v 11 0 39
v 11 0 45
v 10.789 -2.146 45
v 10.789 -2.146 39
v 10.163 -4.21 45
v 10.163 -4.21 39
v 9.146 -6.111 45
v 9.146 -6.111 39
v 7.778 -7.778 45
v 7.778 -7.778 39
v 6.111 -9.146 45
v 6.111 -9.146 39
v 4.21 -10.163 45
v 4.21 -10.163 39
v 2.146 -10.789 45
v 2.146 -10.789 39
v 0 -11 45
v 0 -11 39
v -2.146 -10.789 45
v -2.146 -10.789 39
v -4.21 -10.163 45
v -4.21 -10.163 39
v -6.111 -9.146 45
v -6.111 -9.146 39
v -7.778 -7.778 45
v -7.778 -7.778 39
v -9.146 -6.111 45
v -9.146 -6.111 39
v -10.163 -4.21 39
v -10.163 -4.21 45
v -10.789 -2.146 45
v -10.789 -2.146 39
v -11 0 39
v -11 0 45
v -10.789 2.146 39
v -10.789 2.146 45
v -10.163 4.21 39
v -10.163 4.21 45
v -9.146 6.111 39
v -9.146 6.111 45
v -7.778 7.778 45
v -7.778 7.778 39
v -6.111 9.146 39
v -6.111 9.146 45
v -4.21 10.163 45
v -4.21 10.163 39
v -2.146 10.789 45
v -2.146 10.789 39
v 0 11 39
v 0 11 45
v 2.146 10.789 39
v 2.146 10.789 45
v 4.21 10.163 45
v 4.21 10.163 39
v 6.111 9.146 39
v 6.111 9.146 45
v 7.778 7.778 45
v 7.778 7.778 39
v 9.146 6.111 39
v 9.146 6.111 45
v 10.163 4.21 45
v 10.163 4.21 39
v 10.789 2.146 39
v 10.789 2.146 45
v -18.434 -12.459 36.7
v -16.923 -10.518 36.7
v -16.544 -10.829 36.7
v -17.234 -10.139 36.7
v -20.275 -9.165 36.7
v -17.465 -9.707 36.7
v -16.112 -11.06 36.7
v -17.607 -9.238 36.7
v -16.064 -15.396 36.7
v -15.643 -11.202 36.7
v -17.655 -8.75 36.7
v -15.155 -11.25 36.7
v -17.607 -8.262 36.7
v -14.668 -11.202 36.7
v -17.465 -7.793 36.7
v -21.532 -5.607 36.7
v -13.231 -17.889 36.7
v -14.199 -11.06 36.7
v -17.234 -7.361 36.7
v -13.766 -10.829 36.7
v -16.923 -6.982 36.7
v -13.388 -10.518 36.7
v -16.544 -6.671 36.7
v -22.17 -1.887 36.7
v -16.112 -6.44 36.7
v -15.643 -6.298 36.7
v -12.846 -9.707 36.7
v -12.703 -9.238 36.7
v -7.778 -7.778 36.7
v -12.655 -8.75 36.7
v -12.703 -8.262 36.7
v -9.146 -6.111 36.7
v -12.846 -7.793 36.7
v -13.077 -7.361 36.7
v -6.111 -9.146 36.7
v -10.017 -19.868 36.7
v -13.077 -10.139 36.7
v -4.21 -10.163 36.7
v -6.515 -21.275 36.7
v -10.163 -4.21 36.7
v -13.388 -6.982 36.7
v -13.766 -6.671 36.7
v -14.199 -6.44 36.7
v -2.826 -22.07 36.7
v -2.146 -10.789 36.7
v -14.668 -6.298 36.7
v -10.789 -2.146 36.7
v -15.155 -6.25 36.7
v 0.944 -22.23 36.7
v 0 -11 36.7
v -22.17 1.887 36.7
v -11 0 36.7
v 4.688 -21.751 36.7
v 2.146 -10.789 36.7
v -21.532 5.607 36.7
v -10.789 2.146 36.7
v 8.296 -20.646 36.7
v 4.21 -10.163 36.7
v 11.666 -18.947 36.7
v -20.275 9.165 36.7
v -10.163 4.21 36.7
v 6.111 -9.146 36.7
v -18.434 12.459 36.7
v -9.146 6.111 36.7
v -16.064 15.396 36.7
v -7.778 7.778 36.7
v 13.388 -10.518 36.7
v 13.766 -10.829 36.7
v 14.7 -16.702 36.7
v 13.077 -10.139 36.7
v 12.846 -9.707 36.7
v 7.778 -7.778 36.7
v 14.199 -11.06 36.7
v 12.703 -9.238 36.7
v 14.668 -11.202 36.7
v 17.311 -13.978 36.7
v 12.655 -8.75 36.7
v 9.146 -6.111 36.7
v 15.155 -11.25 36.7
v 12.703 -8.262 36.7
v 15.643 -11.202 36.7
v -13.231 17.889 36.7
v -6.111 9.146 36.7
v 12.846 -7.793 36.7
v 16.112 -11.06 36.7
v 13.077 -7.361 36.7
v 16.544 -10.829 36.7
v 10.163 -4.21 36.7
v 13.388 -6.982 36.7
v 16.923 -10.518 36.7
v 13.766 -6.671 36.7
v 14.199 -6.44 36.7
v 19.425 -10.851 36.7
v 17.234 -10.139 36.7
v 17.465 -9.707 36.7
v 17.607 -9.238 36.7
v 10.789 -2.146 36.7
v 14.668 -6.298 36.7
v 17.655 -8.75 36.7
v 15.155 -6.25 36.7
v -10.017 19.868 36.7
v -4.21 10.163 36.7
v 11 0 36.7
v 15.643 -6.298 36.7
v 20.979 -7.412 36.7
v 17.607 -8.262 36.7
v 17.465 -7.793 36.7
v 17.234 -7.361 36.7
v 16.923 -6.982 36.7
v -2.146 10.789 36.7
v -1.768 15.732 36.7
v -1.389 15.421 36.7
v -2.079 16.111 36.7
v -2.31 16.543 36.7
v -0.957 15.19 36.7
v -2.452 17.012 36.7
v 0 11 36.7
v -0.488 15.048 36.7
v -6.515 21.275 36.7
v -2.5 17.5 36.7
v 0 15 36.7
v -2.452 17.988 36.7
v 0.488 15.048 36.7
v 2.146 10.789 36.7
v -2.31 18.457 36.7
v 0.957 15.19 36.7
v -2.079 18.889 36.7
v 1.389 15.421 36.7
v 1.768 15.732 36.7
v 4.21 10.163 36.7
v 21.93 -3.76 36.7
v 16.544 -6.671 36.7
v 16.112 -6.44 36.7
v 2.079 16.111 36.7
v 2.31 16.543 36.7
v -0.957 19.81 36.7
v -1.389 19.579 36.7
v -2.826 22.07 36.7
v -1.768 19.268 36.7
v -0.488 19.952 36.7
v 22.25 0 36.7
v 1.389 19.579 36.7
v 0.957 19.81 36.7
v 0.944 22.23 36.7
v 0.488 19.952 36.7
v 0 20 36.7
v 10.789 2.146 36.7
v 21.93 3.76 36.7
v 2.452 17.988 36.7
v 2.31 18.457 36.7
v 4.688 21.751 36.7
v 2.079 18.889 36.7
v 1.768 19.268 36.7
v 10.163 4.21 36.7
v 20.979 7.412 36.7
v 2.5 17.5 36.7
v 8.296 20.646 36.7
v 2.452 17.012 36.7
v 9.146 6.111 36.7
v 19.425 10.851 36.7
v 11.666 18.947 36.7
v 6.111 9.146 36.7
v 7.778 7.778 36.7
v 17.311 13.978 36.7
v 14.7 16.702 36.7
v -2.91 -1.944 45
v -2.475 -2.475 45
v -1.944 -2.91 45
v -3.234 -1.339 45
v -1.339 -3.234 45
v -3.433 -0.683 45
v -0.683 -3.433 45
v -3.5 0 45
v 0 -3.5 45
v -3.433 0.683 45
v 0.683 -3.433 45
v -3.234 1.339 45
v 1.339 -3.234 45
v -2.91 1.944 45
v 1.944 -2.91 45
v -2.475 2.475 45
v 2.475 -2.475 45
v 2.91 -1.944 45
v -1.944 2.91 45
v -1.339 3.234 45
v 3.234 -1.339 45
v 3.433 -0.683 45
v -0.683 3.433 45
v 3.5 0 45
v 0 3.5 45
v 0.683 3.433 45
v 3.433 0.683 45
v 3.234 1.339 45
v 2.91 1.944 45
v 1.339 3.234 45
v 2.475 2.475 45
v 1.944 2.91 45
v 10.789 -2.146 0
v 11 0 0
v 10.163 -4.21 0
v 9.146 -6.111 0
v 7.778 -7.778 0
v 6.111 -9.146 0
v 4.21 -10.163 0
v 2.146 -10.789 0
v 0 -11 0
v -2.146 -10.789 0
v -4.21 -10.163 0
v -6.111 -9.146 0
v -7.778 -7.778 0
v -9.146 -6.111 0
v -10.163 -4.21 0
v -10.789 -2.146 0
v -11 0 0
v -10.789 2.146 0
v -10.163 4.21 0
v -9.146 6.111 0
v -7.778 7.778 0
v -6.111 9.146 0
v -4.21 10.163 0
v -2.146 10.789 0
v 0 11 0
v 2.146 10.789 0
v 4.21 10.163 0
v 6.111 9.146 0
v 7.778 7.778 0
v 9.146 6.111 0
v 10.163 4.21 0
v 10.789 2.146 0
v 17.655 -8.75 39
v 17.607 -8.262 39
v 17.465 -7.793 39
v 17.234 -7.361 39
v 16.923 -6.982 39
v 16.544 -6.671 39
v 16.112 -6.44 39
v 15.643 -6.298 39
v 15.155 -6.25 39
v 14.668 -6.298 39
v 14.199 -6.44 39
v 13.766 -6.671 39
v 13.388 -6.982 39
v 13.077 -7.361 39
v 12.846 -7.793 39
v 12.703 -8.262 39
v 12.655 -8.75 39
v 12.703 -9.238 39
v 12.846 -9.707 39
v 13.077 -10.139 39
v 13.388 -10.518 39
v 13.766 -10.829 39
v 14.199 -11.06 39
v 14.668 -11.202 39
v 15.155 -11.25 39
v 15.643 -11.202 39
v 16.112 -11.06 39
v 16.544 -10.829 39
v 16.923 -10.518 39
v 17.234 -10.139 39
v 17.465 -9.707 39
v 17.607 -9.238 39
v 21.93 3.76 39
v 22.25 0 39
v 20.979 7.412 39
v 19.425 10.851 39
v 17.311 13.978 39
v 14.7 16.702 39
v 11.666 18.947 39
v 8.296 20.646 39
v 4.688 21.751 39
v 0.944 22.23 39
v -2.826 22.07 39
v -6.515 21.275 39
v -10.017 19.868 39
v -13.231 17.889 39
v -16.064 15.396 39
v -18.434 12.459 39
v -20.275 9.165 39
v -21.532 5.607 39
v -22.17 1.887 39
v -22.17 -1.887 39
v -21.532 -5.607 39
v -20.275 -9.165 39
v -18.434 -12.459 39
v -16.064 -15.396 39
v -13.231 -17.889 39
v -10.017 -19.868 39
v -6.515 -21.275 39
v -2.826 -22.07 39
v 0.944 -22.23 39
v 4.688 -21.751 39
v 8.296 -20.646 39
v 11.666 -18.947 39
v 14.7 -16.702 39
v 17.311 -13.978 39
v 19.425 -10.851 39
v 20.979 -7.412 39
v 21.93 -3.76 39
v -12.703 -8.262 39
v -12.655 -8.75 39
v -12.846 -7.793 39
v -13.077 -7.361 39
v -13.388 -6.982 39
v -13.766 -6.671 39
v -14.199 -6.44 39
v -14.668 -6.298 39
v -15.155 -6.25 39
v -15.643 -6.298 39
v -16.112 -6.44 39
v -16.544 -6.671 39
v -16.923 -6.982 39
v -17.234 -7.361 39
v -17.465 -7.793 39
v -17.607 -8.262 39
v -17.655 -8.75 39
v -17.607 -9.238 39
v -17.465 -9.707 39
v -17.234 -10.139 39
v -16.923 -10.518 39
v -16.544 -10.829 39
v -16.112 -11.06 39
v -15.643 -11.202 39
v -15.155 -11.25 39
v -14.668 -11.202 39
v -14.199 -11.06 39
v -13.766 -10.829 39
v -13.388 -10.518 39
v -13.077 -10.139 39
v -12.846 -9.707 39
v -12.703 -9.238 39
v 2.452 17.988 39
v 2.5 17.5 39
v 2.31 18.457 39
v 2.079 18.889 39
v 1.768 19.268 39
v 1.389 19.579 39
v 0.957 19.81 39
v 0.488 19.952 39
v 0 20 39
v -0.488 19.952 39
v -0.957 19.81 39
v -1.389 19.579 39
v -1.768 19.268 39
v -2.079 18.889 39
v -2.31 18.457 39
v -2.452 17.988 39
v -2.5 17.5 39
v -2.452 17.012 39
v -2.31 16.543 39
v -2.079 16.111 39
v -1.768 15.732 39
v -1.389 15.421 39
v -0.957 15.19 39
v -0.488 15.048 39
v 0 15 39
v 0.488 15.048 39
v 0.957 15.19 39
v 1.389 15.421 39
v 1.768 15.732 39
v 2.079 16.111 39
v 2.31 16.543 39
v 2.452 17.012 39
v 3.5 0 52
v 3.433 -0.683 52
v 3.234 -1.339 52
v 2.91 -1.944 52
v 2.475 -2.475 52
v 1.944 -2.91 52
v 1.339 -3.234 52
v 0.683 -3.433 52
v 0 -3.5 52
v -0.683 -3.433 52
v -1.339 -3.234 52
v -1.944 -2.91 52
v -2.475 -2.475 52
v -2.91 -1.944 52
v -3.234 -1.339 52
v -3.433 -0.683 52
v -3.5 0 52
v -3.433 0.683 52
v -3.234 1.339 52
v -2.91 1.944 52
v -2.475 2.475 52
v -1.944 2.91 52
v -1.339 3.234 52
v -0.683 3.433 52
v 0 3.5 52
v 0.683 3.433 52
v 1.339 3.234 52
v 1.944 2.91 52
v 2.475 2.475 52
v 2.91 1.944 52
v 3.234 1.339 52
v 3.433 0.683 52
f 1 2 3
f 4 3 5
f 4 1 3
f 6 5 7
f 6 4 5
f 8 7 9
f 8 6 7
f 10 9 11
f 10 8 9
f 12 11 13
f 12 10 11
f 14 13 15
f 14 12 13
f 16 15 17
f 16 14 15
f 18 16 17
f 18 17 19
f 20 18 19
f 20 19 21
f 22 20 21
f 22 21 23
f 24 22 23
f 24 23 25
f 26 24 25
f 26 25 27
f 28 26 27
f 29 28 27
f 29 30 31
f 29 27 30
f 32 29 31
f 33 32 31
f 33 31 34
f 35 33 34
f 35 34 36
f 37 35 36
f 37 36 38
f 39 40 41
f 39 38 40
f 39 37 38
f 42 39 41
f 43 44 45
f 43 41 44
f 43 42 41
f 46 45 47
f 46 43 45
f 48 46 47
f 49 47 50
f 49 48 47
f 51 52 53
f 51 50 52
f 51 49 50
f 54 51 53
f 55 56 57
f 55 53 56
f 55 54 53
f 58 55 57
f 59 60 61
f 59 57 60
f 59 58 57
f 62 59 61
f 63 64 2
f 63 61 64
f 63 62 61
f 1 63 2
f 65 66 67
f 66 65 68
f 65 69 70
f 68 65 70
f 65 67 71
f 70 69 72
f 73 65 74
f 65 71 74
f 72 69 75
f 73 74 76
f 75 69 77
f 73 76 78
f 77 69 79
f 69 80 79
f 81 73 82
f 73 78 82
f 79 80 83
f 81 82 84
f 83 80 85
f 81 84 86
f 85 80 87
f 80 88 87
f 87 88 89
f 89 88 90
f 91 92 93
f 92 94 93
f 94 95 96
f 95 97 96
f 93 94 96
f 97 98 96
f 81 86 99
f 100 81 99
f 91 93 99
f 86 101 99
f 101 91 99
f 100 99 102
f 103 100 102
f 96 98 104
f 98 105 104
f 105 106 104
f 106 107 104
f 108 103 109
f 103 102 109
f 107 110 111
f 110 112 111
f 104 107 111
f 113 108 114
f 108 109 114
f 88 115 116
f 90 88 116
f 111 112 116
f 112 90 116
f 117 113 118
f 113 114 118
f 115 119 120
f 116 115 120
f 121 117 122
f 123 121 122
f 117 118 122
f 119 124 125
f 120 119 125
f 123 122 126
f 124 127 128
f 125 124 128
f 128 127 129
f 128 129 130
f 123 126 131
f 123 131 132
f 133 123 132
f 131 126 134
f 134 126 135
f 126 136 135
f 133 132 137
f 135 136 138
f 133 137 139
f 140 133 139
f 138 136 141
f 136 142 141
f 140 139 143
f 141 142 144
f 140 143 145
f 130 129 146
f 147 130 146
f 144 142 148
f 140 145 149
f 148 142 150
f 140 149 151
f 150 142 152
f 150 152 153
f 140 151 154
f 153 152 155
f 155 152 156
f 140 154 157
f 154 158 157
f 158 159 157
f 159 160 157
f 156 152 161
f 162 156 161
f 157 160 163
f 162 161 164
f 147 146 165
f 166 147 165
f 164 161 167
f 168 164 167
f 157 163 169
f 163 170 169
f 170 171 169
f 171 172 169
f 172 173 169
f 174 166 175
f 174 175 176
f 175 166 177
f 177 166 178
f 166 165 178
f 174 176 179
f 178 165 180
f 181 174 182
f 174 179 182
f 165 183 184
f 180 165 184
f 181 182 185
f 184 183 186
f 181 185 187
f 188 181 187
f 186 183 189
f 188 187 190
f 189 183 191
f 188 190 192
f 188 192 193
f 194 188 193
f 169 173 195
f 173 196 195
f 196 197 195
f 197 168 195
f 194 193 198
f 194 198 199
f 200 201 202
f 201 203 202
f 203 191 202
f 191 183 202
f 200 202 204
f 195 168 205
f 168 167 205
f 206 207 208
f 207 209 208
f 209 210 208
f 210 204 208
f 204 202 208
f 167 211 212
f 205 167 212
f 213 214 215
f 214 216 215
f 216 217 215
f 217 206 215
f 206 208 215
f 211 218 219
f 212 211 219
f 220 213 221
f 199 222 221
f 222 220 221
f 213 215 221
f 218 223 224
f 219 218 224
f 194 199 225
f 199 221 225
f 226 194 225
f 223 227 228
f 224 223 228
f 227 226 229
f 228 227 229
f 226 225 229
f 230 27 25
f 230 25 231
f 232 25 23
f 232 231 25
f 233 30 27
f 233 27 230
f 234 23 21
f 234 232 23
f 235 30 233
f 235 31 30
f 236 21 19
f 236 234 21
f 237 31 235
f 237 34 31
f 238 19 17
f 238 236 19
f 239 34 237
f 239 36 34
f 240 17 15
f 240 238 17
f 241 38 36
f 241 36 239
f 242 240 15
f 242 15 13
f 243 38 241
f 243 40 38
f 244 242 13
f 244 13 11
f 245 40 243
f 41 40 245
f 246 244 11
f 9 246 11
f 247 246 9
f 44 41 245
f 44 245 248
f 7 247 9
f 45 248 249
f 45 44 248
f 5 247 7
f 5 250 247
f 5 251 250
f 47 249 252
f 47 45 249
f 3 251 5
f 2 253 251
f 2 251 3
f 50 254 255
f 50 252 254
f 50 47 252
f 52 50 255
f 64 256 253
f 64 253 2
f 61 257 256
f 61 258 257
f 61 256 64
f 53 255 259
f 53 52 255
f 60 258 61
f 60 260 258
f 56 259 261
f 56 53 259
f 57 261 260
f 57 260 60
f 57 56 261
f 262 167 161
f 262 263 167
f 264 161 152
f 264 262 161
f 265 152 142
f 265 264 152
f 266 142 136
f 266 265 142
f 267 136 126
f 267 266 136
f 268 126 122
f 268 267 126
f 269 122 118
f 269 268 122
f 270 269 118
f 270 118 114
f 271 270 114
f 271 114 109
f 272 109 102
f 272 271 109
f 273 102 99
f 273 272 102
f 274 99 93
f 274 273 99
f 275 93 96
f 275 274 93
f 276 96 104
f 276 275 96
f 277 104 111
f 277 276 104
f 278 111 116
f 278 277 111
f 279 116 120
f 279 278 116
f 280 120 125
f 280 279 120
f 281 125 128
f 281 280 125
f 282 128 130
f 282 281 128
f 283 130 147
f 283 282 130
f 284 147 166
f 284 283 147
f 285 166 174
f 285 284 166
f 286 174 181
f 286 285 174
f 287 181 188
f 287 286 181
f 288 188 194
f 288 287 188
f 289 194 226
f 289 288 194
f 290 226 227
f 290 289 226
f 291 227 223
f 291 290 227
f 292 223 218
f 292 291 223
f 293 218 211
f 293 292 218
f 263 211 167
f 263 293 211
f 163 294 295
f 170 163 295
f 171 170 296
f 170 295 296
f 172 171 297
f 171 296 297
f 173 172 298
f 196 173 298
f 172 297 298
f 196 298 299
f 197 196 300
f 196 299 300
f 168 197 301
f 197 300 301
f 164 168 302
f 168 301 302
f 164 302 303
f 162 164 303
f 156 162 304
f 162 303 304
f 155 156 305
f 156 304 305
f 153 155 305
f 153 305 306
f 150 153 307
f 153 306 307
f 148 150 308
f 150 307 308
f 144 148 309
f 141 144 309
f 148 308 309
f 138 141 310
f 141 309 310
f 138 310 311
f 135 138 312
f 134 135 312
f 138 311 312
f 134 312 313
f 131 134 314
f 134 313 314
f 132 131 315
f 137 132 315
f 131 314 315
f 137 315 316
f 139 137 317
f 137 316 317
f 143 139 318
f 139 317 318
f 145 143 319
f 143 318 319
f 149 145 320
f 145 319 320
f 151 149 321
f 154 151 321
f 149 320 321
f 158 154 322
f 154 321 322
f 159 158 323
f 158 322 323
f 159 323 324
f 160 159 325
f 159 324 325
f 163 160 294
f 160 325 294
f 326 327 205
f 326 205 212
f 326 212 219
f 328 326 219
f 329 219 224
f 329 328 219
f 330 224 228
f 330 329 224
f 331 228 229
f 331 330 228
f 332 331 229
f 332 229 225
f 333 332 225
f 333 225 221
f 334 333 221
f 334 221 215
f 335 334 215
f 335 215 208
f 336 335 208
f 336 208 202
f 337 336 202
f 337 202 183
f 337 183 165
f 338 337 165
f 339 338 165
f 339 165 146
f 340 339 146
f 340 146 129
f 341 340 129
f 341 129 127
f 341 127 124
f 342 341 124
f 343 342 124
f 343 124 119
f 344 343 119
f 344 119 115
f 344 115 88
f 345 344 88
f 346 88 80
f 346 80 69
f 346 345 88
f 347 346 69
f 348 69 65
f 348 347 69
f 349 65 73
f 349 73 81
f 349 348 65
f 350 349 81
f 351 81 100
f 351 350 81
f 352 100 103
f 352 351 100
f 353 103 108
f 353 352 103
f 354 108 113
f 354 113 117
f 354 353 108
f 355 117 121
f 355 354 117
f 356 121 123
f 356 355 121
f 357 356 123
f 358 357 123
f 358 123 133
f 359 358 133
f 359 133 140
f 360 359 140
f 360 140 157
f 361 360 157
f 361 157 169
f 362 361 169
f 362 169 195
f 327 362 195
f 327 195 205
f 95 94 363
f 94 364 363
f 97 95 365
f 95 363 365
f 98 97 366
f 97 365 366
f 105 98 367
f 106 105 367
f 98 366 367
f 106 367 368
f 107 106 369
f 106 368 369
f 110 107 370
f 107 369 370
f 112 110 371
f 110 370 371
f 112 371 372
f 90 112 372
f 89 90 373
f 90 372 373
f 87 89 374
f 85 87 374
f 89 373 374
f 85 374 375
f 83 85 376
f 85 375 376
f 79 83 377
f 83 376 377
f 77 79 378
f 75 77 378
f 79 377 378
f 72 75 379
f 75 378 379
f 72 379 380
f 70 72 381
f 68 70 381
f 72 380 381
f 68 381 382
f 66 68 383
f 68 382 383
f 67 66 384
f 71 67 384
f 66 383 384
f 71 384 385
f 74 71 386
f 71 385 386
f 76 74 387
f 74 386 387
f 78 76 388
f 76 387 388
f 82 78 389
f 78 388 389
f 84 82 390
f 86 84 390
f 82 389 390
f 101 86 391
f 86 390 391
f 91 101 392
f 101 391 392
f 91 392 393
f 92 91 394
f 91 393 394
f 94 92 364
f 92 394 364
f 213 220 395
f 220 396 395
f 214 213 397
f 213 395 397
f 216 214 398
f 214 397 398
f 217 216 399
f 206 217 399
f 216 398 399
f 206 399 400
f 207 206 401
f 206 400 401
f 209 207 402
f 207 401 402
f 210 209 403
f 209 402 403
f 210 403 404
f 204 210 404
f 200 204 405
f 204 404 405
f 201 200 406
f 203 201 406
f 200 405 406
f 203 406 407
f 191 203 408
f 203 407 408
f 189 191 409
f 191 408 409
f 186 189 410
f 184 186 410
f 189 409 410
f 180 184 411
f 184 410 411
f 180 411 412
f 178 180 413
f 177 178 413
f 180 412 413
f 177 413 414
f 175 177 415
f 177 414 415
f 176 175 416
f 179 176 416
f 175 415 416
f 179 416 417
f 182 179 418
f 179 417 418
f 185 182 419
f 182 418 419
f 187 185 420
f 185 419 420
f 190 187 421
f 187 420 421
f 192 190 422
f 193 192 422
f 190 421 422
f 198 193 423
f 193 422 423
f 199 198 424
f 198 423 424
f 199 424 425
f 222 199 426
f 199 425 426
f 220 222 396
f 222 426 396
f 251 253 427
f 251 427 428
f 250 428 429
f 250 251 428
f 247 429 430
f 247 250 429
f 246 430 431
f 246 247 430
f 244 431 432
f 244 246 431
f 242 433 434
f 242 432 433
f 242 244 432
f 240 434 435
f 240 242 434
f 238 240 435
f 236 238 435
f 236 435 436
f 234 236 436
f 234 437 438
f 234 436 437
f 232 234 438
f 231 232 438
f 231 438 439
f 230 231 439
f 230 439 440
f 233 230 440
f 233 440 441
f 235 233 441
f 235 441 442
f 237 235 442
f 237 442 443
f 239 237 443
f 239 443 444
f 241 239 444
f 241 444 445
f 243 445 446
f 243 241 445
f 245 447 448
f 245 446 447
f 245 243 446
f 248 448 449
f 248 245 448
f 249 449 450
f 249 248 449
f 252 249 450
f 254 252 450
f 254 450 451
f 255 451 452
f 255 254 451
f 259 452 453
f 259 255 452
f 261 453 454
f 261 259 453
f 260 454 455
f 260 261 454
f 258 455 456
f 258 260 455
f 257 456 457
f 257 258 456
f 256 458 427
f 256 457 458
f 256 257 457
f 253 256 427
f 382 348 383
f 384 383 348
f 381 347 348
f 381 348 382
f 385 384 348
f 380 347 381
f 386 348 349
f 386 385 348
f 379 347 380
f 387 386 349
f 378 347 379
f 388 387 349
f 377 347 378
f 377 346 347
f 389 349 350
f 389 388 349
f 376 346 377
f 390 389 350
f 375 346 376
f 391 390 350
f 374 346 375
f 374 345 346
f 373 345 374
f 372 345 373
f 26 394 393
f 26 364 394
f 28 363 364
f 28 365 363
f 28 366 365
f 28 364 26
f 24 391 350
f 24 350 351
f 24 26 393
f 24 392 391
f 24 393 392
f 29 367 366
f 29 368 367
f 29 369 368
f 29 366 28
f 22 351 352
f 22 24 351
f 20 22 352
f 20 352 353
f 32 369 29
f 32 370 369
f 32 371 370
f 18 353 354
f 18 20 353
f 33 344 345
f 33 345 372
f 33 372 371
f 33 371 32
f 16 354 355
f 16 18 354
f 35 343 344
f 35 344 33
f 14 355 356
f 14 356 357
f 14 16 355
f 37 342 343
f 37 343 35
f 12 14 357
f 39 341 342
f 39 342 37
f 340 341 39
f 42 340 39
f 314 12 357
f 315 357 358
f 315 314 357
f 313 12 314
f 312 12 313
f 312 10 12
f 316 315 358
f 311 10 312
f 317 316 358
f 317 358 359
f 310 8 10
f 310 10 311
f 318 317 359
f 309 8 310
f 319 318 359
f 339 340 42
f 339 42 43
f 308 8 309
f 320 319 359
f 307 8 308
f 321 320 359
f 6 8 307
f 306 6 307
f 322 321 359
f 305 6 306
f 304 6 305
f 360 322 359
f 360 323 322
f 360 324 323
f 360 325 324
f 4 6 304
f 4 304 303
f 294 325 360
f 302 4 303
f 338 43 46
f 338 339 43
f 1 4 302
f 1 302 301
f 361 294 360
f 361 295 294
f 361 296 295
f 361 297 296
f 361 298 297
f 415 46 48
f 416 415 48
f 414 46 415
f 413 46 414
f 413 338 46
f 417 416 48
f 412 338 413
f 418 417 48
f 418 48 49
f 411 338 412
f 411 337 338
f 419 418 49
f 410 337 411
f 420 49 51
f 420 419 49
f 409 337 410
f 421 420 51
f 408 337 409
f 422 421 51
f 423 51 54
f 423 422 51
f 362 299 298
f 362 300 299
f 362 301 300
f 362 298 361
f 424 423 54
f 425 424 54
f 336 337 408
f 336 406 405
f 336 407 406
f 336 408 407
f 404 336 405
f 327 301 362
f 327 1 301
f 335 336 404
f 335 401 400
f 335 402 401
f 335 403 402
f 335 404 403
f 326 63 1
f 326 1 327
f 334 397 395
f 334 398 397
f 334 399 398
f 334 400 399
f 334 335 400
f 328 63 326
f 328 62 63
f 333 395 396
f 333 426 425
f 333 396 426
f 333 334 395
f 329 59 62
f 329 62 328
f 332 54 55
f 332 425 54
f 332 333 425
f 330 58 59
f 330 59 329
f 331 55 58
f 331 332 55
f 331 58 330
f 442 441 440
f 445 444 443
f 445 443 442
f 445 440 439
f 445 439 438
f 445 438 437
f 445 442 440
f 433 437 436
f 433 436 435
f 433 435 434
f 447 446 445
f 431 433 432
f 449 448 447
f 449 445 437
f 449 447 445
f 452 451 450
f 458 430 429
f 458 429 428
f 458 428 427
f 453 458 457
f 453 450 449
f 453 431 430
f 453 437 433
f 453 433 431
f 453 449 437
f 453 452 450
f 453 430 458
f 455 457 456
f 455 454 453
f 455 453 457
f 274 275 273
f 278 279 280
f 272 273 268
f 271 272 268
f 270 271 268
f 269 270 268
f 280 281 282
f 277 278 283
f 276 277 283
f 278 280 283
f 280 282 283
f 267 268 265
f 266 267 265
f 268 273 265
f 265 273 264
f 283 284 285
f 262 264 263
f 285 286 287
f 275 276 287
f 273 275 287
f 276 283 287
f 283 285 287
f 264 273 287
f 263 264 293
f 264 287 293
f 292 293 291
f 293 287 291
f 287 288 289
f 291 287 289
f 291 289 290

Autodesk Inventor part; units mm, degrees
ref_plane "YZ Plane" through (0, 0, 0) normal (1, 0, 0) x (0, 1, 0)
ref_plane "XZ Plane" through (0, 0, 0) normal (0, 1, 0) x (-1, 0, 0)
sketch "Sketch1" plane through (0, 0, 0) normal (0, 0, 1) x (1, 0, 0)
  circle A0 centre (0, 0) radius 11
  dimension "d0" = 22
extrude "Extrusion1" add sketch "Sketch1" along normal blind 45
ref_plane "Work Plane1" through (0, 0, 39) normal (0, 0, 1) x (1, 0, 0)
sketch "Sketch2" plane through (0, 0, 39) normal (0, 0, 1) x (1, 0, 0)
  circle A0 centre (0, 0) radius 22.25
  circle A1 centre (0, 17.5) radius 2.5
  circle A2 centre (-15.1554, -8.75) radius 2.5
  circle A3 centre (15.1554, -8.75) radius 2.5
  dimension "d4" = 44.5
  dimension "d5" = 5
  dimension "d6" = 17.5
  dimension "d9" = 360
extrude "Extrusion2" add sketch "Sketch2" against normal blind 2.3
sketch "Sketch3" plane through (0, 0, 45) normal (0, 0, 1) x (1, 0, 0)
  circle A0 centre (0, 0) radius 3.5
  dimension "d13" = 7
extrude "Extrusion3" add sketch "Sketch3" along normal blind 7
properties part number "Slip Ring" material "ABS Plastic"
